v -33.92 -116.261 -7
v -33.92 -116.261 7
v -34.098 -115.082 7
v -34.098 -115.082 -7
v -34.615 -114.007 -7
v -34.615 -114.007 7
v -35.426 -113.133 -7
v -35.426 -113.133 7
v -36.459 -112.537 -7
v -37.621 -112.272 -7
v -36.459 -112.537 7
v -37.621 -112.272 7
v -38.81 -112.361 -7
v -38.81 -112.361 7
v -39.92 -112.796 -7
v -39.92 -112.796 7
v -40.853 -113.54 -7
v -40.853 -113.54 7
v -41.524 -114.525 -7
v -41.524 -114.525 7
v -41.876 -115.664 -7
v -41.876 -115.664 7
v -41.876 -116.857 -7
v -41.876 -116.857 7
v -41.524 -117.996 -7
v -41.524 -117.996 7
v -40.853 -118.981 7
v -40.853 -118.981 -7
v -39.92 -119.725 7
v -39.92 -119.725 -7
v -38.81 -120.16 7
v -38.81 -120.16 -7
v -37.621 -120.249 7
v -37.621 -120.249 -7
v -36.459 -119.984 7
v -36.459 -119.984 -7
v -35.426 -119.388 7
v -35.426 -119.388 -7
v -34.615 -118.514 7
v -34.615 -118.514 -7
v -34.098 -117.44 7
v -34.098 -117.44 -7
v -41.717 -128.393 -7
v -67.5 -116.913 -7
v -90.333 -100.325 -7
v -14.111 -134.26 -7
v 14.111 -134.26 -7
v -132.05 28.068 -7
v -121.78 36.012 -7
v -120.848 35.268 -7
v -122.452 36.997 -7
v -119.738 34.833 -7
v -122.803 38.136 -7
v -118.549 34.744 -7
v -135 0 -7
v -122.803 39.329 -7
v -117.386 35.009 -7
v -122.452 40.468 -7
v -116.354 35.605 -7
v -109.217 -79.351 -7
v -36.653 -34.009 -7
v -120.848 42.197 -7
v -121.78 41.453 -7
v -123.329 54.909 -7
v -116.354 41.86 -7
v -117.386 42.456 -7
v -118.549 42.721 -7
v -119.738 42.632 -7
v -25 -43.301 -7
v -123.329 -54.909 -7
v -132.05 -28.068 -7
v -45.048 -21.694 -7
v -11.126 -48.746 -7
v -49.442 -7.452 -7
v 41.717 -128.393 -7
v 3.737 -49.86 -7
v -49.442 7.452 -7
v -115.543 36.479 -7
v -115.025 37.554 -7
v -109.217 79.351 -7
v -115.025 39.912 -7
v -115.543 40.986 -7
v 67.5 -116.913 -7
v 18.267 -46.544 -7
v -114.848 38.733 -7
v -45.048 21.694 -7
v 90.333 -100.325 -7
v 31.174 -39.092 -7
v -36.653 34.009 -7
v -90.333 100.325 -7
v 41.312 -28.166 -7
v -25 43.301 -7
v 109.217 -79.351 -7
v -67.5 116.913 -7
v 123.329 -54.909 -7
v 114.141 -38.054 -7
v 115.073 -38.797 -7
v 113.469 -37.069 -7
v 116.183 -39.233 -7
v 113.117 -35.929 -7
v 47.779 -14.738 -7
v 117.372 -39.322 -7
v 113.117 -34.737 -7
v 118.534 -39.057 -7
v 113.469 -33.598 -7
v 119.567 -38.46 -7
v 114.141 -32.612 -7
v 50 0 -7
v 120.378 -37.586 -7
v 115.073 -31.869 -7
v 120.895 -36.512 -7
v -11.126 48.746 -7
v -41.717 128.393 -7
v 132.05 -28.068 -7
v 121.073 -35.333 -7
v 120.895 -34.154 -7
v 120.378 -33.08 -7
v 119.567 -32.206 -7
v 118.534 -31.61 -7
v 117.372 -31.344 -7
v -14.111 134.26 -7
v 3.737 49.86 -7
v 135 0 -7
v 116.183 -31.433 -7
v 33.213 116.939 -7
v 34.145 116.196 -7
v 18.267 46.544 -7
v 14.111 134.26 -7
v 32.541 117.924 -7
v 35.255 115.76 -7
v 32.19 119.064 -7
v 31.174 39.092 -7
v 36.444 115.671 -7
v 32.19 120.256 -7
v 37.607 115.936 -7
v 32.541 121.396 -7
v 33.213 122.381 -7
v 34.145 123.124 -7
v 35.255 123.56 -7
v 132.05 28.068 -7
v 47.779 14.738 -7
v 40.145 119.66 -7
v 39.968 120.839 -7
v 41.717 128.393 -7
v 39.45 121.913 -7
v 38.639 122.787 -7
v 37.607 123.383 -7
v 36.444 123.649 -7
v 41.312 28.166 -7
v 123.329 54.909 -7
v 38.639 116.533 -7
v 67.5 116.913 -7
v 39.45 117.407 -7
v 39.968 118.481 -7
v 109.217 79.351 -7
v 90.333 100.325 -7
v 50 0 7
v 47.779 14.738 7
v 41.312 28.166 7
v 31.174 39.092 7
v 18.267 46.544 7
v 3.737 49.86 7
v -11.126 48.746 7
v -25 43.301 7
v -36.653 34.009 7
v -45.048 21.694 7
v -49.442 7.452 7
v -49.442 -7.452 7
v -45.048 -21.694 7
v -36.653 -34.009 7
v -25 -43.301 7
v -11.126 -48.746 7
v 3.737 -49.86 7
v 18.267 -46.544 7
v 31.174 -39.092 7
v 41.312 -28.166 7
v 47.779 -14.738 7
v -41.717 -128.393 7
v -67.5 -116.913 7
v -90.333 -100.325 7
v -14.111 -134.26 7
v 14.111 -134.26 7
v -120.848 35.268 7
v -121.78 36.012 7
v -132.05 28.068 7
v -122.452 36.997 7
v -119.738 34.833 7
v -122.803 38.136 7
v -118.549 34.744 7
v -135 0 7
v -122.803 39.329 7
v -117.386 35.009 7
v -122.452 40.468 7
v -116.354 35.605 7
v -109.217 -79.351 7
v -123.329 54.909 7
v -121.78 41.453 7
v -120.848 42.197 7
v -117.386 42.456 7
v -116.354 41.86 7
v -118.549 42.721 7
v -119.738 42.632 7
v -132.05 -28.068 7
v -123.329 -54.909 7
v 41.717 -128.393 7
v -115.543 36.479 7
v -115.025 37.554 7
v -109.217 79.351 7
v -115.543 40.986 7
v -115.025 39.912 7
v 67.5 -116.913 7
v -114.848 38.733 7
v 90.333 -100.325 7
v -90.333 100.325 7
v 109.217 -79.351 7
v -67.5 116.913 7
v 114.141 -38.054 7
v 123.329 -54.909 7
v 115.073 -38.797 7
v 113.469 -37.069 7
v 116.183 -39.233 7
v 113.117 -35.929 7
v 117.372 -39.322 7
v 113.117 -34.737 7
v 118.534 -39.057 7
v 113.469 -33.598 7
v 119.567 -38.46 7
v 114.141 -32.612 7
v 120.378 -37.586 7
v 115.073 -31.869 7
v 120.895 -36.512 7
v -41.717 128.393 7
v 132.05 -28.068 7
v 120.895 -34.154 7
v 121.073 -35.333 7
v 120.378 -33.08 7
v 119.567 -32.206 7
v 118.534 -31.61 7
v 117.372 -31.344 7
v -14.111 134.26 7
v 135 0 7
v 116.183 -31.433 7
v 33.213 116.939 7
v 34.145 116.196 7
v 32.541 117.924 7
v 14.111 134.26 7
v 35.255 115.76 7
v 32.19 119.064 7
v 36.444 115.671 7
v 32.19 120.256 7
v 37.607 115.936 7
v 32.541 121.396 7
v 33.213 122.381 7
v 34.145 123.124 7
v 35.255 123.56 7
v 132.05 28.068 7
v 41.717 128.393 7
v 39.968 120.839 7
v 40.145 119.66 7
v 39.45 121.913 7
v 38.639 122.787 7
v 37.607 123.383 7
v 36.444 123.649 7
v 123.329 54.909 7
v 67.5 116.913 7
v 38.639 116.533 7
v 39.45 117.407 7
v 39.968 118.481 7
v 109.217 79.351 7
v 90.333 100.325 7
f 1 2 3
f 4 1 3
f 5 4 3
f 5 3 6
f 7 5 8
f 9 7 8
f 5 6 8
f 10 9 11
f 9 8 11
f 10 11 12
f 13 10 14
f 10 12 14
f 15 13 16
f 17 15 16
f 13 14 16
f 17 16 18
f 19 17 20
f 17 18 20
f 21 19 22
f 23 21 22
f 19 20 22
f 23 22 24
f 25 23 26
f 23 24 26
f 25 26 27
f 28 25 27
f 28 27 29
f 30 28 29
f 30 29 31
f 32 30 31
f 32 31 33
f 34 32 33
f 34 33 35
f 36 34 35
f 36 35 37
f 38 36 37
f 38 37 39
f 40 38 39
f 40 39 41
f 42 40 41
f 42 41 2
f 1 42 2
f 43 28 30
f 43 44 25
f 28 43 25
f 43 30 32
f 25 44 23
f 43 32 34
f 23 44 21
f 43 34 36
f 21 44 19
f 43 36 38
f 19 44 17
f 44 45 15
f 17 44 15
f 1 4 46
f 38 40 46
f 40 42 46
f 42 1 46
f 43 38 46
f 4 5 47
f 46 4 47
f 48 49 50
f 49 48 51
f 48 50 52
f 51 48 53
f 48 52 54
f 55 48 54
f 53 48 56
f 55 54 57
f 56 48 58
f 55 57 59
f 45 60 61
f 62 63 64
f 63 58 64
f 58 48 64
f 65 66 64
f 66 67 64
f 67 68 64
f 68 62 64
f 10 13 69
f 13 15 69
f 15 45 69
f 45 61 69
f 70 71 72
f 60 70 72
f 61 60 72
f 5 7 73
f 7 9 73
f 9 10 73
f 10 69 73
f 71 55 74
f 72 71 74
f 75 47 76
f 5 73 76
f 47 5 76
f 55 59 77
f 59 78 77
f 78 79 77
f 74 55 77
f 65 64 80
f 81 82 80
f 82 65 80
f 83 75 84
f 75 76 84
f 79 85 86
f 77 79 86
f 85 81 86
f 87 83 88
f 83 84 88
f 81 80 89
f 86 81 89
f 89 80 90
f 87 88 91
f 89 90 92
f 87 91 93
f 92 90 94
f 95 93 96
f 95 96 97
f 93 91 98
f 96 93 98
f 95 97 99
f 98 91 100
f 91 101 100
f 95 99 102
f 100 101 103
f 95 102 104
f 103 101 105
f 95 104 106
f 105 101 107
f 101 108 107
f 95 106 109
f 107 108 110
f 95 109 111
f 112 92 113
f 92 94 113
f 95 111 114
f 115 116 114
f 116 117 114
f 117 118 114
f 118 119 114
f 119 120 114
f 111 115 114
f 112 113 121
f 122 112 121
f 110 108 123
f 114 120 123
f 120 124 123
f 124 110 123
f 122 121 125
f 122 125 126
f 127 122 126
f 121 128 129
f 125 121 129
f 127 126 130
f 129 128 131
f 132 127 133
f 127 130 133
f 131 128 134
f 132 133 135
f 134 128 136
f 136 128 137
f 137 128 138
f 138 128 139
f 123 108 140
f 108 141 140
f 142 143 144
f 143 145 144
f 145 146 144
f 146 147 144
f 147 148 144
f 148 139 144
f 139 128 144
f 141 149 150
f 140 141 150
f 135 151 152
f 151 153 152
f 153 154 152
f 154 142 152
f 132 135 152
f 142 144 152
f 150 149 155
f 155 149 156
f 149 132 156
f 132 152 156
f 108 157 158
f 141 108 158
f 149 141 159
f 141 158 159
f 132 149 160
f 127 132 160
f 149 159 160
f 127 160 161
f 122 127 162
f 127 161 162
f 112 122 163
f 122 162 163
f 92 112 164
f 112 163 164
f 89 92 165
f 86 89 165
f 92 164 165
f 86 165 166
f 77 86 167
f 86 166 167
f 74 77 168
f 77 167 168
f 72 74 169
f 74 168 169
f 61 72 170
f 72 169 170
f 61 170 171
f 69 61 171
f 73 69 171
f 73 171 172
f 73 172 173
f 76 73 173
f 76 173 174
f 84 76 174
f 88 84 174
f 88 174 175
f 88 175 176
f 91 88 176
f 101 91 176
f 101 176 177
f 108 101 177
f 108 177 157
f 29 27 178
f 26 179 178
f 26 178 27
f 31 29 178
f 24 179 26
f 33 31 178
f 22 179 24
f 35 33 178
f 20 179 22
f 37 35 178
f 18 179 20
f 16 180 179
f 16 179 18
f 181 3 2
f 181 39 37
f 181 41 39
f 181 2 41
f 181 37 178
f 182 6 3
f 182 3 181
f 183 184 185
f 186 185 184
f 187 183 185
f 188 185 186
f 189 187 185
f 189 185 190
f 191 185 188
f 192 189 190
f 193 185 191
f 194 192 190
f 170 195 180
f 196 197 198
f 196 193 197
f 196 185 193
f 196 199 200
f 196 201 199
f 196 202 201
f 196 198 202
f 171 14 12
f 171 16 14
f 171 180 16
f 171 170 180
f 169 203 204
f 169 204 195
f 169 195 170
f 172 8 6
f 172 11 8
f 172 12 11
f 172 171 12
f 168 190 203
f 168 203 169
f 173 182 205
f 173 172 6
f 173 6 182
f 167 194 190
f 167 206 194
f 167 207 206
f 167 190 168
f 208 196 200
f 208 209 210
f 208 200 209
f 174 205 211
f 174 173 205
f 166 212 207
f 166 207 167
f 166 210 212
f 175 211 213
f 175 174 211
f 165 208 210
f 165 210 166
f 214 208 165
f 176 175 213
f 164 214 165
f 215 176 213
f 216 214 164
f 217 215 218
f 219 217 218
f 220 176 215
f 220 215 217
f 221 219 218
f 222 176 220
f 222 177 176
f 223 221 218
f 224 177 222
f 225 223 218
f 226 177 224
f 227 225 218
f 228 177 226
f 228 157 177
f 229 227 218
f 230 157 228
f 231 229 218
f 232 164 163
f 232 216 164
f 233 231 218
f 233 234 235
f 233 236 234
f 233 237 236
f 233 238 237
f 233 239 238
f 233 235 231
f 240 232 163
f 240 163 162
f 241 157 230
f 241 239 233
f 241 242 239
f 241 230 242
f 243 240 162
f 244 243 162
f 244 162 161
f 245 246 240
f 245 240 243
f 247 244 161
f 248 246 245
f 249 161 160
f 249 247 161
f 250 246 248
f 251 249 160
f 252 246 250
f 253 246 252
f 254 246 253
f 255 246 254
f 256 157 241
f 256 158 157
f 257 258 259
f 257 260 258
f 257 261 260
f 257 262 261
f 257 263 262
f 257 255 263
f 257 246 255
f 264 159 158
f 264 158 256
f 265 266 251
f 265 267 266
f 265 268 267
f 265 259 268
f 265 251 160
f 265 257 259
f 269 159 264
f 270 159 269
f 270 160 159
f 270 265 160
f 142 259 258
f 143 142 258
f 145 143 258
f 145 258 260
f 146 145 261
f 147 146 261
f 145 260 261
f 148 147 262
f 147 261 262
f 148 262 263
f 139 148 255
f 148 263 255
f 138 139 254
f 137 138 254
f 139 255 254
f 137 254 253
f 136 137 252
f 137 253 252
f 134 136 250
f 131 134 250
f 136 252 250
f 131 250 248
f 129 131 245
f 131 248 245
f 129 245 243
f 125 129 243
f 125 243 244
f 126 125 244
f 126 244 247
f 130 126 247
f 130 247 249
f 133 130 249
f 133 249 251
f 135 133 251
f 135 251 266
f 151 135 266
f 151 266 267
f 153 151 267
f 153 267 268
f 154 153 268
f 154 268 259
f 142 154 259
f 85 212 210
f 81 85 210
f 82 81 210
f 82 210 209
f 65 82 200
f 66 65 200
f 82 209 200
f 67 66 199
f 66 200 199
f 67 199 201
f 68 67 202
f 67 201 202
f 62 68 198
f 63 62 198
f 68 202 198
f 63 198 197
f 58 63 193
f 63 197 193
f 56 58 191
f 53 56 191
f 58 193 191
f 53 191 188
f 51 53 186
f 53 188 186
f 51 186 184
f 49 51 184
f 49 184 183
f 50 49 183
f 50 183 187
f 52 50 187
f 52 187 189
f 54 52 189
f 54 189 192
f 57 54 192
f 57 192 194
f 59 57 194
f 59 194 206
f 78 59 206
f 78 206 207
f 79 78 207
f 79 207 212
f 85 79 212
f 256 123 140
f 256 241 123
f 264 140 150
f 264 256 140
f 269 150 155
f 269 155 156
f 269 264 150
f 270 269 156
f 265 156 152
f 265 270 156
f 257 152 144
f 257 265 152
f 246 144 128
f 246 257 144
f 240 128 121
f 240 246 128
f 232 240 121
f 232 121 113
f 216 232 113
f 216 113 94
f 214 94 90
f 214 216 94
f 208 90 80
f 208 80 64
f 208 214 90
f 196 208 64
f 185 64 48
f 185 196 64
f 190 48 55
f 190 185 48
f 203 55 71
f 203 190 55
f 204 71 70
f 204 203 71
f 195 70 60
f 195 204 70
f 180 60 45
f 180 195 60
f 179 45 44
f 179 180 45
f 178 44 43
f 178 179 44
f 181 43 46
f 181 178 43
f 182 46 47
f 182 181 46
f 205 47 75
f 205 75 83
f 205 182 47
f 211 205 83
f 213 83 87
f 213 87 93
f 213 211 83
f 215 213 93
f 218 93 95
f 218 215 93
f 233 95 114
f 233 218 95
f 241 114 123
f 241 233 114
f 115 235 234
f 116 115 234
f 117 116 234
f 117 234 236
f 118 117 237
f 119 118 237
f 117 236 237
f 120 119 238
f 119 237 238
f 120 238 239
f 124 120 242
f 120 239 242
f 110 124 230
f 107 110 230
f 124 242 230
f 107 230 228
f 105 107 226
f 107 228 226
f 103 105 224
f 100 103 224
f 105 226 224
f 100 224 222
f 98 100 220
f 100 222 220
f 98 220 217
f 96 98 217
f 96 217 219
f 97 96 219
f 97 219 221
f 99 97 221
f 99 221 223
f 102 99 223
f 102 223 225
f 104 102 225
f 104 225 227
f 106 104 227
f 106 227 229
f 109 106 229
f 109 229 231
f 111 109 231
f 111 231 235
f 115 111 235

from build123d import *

# Parameters (mm, degrees)
SCHIZZO1_R        = 135
ESTRUSIONE1_DEPTH = 7
SCHIZZO2_R        = 50
SCHIZZO2_R_2      = 4
ESTRUSIONE2_DEPTH = 192.431449872


with BuildPart() as part:
    # Schizzo1 → Estrusione1 (new, symmetric)
    with BuildSketch(Plane.XY):
        Circle(SCHIZZO1_R)
    extrude(amount=ESTRUSIONE1_DEPTH, both=True)

    # Schizzo2 → Estrusione2 (cut, through all)
    with BuildSketch(Plane.XY.offset(7)):
        Circle(SCHIZZO2_R)
        with Locations((-118.84774905, 38.732577319)):
            Circle(SCHIZZO2_R_2)
        with Locations((36.145364343, 119.659987617)):
            Circle(SCHIZZO2_R_2)
        with Locations((117.072774642, -35.333125777)):
            Circle(SCHIZZO2_R_2)
        with Locations((-37.920338752, -116.260536075)):
            Circle(SCHIZZO2_R_2)
    extrude(amount=-ESTRUSIONE2_DEPTH, mode=Mode.SUBTRACT)


solid = part.part
